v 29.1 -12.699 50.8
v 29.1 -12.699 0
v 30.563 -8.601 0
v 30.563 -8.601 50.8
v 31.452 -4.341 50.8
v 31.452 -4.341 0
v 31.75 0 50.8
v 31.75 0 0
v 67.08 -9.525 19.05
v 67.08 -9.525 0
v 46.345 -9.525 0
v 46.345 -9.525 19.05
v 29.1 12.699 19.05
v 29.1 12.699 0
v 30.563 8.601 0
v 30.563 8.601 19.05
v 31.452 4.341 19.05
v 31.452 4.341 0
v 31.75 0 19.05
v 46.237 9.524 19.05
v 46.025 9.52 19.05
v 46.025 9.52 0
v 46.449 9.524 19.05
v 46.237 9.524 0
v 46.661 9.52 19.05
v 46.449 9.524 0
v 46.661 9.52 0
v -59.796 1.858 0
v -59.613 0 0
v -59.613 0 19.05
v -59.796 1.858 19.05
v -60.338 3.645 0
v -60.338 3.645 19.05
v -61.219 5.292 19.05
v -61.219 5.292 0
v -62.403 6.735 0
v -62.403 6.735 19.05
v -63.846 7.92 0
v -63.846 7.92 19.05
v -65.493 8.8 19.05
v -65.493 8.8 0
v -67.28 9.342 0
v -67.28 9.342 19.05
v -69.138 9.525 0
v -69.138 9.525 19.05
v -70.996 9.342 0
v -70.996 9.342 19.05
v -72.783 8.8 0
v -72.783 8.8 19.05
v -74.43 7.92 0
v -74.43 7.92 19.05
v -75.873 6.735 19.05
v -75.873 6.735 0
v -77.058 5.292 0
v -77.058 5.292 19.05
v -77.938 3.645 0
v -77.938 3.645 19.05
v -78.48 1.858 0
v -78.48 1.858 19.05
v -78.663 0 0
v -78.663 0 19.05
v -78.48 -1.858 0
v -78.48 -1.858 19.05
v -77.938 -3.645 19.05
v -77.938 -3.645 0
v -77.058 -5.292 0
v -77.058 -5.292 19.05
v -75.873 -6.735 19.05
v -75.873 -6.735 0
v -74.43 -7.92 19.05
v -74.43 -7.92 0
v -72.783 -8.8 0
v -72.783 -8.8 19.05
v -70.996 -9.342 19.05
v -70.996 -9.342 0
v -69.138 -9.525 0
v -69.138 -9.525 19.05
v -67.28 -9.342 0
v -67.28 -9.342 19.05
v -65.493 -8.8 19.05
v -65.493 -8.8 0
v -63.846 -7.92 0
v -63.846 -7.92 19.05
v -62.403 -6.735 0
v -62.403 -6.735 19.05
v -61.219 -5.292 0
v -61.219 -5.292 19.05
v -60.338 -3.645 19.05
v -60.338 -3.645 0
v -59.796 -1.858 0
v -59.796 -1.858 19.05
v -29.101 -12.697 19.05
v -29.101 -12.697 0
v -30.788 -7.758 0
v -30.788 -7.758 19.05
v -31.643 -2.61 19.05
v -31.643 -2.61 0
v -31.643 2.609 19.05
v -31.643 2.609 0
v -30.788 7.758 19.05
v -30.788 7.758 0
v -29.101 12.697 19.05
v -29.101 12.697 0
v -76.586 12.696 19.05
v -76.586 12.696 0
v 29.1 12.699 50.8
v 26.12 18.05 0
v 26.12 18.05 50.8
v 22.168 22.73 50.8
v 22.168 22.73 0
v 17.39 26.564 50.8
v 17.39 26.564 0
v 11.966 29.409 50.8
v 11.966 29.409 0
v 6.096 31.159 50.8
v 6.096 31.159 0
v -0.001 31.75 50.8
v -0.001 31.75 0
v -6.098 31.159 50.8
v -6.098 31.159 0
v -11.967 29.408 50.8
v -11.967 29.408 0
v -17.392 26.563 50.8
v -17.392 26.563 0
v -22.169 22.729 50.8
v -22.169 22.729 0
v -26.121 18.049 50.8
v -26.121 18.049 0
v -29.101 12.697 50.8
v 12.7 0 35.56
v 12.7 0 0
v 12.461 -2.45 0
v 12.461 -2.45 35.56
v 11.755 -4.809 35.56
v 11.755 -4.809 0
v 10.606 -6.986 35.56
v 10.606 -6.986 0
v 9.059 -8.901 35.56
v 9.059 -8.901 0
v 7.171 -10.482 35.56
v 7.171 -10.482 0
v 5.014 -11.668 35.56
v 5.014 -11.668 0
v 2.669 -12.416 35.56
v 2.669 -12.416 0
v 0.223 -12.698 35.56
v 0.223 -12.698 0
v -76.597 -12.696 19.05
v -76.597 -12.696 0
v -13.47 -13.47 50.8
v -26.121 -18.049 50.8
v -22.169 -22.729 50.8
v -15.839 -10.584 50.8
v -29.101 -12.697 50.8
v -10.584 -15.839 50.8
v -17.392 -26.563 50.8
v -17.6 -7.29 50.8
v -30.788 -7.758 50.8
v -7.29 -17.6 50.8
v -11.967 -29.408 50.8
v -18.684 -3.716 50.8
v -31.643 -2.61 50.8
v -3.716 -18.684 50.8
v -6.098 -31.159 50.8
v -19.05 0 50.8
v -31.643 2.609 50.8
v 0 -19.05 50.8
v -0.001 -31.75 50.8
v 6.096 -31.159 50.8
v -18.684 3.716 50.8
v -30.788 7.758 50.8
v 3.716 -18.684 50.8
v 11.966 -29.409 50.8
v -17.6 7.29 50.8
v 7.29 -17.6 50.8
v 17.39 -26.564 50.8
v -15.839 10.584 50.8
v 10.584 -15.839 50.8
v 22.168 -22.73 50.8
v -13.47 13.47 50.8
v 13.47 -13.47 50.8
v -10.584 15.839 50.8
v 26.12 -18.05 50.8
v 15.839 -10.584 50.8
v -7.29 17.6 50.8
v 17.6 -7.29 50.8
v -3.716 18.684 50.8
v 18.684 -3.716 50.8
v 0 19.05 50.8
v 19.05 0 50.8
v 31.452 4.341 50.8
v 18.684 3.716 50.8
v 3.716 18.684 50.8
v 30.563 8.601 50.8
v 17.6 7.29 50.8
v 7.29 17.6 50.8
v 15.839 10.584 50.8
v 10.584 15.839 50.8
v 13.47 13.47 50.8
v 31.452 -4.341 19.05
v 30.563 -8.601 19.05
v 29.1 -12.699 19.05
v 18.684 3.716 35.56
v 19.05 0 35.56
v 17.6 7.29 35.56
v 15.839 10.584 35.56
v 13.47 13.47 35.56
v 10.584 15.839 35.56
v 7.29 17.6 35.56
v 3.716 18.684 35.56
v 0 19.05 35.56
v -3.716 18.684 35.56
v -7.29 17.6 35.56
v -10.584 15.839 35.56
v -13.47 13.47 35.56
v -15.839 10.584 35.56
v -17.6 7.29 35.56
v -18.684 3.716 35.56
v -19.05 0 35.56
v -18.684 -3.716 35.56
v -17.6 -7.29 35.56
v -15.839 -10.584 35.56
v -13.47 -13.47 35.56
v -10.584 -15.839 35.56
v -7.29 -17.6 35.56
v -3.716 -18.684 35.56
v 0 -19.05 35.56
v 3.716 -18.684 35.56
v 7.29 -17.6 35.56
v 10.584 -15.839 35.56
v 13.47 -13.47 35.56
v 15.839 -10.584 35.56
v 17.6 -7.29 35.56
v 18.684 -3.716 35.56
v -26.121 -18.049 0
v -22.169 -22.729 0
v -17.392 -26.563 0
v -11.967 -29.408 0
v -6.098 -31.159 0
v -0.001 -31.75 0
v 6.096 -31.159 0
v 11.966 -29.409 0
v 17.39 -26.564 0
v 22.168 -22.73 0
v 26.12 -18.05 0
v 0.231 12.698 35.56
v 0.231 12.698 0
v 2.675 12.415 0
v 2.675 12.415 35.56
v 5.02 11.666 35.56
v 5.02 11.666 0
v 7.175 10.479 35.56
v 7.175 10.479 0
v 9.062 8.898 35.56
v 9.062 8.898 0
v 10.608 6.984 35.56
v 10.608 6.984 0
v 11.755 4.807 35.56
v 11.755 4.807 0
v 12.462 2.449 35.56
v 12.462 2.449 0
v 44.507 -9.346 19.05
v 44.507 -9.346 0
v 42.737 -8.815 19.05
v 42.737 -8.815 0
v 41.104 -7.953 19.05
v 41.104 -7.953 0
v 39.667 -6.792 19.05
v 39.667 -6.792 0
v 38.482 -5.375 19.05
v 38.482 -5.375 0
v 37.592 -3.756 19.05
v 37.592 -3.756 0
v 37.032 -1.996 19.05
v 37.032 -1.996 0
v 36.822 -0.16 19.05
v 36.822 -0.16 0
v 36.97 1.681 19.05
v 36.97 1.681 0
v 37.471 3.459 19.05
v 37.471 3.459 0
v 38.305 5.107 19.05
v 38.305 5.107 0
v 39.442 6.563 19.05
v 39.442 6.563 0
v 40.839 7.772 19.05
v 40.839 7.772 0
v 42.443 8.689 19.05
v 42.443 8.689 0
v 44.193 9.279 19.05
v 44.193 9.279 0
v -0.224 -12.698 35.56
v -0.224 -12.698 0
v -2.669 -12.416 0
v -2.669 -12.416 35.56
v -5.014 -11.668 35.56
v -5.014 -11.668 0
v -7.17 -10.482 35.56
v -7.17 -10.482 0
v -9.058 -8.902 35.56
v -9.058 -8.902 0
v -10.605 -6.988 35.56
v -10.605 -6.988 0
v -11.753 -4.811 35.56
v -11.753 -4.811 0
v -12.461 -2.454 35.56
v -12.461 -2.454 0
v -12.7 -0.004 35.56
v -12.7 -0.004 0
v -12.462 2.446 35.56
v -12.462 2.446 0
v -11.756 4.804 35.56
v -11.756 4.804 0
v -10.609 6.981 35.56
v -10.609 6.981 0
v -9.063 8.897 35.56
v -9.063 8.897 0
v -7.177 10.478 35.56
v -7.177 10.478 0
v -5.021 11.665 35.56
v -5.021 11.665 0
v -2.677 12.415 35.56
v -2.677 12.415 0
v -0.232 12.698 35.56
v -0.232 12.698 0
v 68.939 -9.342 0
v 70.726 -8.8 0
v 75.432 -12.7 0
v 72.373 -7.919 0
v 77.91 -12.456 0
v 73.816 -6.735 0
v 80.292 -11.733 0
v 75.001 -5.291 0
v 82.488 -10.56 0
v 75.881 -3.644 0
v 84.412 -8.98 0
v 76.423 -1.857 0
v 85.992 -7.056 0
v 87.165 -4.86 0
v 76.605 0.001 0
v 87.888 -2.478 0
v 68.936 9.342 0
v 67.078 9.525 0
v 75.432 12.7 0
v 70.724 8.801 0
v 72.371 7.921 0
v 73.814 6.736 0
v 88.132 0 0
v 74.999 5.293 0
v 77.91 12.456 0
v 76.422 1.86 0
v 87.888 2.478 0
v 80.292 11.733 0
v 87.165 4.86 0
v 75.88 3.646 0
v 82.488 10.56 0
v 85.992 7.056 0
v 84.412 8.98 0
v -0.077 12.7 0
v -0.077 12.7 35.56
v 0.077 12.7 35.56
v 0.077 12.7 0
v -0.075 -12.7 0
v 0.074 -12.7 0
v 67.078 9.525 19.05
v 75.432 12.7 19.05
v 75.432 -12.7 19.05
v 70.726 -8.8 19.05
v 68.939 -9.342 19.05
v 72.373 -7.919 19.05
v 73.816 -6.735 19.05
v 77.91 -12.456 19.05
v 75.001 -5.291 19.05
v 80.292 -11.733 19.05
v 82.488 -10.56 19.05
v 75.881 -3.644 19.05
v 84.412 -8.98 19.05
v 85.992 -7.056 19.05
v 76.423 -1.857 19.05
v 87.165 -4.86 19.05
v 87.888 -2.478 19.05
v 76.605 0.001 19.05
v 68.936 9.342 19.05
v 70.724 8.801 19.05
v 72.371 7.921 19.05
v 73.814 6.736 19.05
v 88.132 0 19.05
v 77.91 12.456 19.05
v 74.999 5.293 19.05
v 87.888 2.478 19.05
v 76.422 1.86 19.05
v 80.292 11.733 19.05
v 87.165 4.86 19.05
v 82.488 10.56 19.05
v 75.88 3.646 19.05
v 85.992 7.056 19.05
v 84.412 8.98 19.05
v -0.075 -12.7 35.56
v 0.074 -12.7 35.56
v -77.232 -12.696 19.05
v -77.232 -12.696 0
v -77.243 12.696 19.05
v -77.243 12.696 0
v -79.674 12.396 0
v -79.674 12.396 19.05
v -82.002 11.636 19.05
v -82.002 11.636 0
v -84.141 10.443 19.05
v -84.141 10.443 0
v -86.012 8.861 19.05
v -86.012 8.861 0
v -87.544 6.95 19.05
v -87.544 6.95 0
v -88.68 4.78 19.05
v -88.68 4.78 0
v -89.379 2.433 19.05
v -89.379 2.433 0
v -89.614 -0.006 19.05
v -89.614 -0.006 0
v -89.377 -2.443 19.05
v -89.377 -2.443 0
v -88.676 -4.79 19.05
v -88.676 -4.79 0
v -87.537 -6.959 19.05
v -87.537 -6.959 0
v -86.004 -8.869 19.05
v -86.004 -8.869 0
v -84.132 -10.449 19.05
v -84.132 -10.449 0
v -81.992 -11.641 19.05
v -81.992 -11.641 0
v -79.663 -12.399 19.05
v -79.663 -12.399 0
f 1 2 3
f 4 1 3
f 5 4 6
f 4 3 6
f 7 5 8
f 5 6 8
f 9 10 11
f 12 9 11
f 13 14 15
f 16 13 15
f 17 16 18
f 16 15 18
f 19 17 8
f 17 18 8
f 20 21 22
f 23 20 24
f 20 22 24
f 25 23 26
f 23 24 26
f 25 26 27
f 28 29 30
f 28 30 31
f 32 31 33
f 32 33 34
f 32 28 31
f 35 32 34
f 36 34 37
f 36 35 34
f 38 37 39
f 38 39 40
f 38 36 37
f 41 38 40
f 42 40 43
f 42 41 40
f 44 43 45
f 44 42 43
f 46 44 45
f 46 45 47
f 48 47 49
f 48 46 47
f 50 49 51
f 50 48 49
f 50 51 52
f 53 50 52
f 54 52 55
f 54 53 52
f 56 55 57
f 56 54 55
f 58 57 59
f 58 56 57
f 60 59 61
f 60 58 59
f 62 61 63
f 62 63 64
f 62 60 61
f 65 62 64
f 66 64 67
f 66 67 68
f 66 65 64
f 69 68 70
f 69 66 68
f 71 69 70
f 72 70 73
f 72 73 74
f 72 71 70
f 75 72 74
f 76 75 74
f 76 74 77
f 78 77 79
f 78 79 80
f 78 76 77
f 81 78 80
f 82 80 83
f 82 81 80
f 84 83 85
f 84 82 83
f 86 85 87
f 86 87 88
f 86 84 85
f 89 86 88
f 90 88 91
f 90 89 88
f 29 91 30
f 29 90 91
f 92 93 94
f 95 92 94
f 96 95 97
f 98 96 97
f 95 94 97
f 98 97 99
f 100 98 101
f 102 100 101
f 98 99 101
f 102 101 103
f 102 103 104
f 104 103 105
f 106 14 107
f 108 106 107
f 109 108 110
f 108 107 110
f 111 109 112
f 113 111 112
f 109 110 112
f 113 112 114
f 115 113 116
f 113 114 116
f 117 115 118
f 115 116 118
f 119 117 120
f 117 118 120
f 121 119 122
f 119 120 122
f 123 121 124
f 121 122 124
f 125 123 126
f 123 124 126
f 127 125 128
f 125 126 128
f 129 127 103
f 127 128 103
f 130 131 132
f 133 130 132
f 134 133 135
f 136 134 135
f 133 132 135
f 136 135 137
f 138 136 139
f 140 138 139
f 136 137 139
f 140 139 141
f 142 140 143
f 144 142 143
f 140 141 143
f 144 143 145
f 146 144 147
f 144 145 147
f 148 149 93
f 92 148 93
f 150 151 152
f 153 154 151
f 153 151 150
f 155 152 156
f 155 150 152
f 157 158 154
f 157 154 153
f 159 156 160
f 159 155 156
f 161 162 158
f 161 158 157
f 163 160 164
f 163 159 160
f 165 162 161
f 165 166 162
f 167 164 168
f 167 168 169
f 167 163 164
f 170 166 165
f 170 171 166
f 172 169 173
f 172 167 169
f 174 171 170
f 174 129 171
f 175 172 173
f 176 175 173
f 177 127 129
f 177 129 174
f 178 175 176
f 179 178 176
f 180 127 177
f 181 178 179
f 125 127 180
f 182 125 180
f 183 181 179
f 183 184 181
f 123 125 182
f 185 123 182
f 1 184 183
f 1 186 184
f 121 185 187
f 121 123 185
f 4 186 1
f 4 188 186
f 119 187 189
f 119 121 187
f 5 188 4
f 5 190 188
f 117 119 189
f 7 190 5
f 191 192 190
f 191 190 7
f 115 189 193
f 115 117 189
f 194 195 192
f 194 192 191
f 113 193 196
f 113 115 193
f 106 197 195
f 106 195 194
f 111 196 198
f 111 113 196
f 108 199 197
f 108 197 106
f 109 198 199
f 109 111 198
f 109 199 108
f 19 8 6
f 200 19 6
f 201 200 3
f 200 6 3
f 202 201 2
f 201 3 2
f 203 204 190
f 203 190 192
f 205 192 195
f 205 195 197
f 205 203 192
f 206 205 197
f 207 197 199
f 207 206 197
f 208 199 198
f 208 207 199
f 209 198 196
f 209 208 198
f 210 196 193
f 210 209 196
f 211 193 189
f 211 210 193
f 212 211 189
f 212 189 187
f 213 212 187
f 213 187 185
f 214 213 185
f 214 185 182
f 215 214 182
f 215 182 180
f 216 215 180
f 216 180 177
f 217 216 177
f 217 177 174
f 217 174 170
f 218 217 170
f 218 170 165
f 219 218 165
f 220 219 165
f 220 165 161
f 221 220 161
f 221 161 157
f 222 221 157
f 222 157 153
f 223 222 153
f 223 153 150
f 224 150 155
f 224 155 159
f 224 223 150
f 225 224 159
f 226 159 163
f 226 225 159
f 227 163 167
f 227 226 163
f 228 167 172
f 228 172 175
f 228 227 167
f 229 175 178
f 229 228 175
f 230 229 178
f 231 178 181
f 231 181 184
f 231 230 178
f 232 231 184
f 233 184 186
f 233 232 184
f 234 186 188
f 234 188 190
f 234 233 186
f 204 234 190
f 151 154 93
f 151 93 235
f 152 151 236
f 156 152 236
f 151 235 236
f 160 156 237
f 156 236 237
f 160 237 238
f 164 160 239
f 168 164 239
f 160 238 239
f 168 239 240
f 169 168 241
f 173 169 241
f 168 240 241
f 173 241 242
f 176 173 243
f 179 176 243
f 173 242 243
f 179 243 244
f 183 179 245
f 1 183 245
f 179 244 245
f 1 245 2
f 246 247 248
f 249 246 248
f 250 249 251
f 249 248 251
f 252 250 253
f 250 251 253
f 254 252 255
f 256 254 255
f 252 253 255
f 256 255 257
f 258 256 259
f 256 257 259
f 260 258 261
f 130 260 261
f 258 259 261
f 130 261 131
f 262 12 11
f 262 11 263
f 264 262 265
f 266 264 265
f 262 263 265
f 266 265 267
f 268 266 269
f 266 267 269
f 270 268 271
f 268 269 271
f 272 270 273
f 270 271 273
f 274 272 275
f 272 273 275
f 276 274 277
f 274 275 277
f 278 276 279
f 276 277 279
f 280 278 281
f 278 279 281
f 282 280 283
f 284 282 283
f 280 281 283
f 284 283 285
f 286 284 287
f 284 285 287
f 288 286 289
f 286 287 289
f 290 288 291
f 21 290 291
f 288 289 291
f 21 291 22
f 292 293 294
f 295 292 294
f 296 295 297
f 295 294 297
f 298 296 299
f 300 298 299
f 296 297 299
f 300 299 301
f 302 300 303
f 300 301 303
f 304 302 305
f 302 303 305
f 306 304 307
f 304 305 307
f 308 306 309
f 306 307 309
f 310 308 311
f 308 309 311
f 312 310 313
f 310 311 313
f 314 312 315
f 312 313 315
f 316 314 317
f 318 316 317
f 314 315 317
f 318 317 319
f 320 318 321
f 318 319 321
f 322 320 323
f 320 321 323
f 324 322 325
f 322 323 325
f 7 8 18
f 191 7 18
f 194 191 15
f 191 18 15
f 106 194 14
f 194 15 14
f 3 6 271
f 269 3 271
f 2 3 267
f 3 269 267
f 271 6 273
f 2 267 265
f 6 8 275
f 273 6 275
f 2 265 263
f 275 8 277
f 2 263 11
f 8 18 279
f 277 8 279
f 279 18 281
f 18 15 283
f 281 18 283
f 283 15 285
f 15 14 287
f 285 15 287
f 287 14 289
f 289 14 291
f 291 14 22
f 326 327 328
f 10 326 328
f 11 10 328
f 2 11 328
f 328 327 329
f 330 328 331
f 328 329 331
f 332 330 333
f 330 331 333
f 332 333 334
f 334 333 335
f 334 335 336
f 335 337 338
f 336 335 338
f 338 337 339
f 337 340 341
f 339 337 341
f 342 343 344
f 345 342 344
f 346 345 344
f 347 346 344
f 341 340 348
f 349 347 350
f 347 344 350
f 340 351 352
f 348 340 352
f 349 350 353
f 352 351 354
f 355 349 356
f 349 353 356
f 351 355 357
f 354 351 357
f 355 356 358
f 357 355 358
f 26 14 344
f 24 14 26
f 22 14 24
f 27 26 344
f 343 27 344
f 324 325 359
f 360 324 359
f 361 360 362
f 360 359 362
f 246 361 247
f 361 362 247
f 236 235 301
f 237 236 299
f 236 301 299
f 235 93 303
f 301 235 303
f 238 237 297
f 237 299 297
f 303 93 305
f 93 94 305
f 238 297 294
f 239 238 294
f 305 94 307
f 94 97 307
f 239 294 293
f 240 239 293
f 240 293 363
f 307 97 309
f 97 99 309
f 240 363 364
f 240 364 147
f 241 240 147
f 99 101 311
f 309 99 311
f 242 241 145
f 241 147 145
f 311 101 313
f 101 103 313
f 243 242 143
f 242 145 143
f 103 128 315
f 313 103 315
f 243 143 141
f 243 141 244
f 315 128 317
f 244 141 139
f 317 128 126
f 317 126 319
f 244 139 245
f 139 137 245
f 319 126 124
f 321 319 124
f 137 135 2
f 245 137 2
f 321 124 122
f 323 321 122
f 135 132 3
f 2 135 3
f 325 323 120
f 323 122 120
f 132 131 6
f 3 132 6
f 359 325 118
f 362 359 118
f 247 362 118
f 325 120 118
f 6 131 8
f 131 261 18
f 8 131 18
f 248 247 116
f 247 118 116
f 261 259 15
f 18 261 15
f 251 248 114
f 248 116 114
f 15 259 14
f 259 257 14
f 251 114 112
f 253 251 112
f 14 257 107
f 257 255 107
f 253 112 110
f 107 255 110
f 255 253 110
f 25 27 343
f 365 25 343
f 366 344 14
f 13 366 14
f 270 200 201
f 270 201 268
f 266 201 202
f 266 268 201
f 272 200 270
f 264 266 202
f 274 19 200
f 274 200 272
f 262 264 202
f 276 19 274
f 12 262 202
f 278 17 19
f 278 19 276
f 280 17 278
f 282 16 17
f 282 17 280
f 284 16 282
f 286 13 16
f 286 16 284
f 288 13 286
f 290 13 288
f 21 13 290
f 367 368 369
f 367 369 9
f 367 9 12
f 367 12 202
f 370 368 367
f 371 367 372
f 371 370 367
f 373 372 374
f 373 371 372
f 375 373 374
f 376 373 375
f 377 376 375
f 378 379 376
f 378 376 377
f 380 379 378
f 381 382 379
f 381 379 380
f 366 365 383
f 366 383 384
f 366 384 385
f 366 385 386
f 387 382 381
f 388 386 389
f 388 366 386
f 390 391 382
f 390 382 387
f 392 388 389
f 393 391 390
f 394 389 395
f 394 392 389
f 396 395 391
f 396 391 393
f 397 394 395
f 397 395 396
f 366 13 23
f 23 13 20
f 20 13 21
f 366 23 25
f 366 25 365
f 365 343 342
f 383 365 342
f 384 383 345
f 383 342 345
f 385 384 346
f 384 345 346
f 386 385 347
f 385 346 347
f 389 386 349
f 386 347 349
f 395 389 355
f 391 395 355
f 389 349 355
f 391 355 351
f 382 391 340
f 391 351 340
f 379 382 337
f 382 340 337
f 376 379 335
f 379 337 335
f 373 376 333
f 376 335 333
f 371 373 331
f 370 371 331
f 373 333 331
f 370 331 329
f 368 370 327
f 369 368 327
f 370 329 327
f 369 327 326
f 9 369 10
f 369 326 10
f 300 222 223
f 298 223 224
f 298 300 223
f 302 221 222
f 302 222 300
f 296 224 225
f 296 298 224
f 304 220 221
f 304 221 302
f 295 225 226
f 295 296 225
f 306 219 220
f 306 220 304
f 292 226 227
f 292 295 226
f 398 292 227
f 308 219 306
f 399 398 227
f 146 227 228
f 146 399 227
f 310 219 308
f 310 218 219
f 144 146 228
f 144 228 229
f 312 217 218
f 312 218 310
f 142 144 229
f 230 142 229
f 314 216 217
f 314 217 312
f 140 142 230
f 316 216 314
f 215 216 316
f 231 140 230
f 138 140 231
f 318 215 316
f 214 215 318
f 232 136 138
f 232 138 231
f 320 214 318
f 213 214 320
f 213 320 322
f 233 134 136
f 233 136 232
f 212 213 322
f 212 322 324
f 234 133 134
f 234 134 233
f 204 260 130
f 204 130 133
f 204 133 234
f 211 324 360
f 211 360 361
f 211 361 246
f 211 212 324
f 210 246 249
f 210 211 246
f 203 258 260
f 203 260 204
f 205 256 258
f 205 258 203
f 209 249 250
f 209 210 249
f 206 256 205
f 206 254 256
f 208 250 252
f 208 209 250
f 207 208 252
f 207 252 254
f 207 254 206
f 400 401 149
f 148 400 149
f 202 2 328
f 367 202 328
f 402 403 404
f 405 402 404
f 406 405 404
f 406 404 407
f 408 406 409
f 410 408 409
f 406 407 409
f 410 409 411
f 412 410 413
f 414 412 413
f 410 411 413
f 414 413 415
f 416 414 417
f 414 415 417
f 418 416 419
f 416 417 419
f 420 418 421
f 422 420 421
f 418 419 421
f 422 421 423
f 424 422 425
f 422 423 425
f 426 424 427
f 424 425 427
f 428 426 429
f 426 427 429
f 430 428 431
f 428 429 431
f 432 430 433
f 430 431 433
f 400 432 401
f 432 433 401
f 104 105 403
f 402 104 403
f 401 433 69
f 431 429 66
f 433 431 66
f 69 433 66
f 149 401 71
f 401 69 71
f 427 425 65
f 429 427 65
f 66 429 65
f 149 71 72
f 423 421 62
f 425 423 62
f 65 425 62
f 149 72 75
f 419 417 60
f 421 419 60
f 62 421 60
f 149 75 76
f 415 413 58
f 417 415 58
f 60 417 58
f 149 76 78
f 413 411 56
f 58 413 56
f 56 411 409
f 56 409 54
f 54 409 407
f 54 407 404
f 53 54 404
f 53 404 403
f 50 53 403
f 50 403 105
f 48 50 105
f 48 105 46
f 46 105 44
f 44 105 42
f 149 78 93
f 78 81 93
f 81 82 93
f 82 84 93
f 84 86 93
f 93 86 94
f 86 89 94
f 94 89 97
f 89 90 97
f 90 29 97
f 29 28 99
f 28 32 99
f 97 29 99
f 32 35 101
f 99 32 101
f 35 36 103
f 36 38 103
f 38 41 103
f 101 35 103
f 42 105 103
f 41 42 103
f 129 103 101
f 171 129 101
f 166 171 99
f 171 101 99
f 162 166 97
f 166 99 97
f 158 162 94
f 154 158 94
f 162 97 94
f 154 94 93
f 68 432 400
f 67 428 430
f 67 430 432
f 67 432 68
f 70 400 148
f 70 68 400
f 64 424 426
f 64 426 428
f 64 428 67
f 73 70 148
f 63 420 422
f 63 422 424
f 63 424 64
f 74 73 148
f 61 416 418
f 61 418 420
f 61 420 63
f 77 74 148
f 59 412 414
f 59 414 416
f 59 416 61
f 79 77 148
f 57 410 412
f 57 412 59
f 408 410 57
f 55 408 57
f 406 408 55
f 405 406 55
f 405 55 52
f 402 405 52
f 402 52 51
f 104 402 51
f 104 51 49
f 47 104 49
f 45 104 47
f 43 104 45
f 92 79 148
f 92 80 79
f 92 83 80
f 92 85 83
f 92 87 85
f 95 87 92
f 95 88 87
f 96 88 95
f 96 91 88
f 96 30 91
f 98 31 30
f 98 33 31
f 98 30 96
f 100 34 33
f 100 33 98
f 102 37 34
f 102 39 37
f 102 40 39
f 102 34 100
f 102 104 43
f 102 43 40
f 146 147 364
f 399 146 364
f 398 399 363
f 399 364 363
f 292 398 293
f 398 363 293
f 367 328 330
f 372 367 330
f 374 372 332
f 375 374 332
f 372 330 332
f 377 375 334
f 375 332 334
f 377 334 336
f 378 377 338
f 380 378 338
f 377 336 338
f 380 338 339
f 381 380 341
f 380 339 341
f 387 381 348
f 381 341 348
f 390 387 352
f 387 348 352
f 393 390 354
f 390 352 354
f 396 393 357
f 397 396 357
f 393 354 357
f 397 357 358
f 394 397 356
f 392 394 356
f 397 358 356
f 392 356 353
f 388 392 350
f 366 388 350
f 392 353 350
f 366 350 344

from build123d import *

# Parameters (mm, degrees)
F0_R     = 9.525
F1_DEPTH = 19.05
F0_R_2   = 19.05
F2_DEPTH = 50.8
F3_DEPTH = 35.56


with BuildPart() as f1:
    # F0 (on Top) → F1 (new body)
    with BuildSketch(Plane.XY):
        with BuildLine():
            ThreePointArc((-29.100544, -12.697276), (-31.75, -0.000106), (-29.100629, 12.697083))
            Line((-29.100629, 12.697083), (-76.585714, 12.695758))
            Line((-76.585714, 12.695758), (-77.2429, 12.695739))
            ThreePointArc((-77.2429, 12.695739), (-89.613952, -0.005562), (-77.23178, -12.696022))
            Line((-77.23178, -12.696022), (-76.596787, -12.696039))
            Line((-76.596787, -12.696039), (-29.100544, -12.697276))
        make_face()
        with Locations((-69.138251, 0)):
            Circle(F0_R, mode=Mode.SUBTRACT)
        with BuildLine():
            ThreePointArc((29.09992, 12.698707), (31.08042, 6.486141), (31.75, 0))
            ThreePointArc((31.75, 0), (31.08041, -6.486187), (29.099882, -12.698793))
            Line((29.099882, -12.698793), (75.431836, -12.7))
            ThreePointArc((75.431836, -12.7), (88.132166, 1.2e-05), (75.431812, 12.7))
            Line((75.431812, 12.7), (29.09992, 12.698707))
        make_face()
        with BuildLine():
            ThreePointArc((67.078047, 9.525), (76.60549, 0.001222), (67.08049, -9.525))
            Line((67.08049, -9.525), (46.345286, -9.525))
            ThreePointArc((46.345286, -9.525), (36.821636, -0.160386), (46.02456, 9.519599))
            ThreePointArc((46.02456, 9.519599), (46.342843, 9.525), (46.661128, 9.519762))
            Line((46.661128, 9.519762), (67.078047, 9.525))
        make_face(mode=Mode.SUBTRACT)
    extrude(amount=F1_DEPTH)


with BuildPart() as f2:
    # F0 (on Top) → F2 (new body)
    with BuildSketch(Plane.XY):
        with BuildLine():
            ThreePointArc((29.099882, -12.698793), (31.08041, -6.486187), (31.75, 0))
            ThreePointArc((31.75, 0), (31.08042, 6.486141), (29.09992, 12.698707))
            ThreePointArc((29.09992, 12.698707), (-0.000886, 31.75), (-29.100629, 12.697083))
            ThreePointArc((-29.100629, 12.697083), (-31.75, -0.000106), (-29.100544, -12.697276))
            ThreePointArc((-29.100544, -12.697276), (-0.000827, -31.75), (29.099882, -12.698793))
        make_face()
        Circle(F0_R_2, mode=Mode.SUBTRACT)
    extrude(amount=F2_DEPTH)

    # F0 (on Top) → F3 (join)
    with BuildSketch(Plane.XY):
        Circle(F0_R_2)
        with BuildLine():
            ThreePointArc((0.230873, 12.697901), (9.061514, 8.898256), (12.7, 0))
            ThreePointArc((12.7, 0), (9.058786, -8.901033), (0.223088, -12.69804))
            ThreePointArc((0.223088, -12.69804), (-0.000331, -12.7), (-0.223749, -12.698029))
            ThreePointArc((-0.223749, -12.698029), (-12.699999, -0.003917), (-0.231582, 12.697888))
            ThreePointArc((-0.231582, 12.697888), (-0.000354, 12.7), (0.230873, 12.697901))
        make_face(mode=Mode.SUBTRACT)
    extrude(amount=F3_DEPTH)


solid = Compound([f1.part, f2.part])
